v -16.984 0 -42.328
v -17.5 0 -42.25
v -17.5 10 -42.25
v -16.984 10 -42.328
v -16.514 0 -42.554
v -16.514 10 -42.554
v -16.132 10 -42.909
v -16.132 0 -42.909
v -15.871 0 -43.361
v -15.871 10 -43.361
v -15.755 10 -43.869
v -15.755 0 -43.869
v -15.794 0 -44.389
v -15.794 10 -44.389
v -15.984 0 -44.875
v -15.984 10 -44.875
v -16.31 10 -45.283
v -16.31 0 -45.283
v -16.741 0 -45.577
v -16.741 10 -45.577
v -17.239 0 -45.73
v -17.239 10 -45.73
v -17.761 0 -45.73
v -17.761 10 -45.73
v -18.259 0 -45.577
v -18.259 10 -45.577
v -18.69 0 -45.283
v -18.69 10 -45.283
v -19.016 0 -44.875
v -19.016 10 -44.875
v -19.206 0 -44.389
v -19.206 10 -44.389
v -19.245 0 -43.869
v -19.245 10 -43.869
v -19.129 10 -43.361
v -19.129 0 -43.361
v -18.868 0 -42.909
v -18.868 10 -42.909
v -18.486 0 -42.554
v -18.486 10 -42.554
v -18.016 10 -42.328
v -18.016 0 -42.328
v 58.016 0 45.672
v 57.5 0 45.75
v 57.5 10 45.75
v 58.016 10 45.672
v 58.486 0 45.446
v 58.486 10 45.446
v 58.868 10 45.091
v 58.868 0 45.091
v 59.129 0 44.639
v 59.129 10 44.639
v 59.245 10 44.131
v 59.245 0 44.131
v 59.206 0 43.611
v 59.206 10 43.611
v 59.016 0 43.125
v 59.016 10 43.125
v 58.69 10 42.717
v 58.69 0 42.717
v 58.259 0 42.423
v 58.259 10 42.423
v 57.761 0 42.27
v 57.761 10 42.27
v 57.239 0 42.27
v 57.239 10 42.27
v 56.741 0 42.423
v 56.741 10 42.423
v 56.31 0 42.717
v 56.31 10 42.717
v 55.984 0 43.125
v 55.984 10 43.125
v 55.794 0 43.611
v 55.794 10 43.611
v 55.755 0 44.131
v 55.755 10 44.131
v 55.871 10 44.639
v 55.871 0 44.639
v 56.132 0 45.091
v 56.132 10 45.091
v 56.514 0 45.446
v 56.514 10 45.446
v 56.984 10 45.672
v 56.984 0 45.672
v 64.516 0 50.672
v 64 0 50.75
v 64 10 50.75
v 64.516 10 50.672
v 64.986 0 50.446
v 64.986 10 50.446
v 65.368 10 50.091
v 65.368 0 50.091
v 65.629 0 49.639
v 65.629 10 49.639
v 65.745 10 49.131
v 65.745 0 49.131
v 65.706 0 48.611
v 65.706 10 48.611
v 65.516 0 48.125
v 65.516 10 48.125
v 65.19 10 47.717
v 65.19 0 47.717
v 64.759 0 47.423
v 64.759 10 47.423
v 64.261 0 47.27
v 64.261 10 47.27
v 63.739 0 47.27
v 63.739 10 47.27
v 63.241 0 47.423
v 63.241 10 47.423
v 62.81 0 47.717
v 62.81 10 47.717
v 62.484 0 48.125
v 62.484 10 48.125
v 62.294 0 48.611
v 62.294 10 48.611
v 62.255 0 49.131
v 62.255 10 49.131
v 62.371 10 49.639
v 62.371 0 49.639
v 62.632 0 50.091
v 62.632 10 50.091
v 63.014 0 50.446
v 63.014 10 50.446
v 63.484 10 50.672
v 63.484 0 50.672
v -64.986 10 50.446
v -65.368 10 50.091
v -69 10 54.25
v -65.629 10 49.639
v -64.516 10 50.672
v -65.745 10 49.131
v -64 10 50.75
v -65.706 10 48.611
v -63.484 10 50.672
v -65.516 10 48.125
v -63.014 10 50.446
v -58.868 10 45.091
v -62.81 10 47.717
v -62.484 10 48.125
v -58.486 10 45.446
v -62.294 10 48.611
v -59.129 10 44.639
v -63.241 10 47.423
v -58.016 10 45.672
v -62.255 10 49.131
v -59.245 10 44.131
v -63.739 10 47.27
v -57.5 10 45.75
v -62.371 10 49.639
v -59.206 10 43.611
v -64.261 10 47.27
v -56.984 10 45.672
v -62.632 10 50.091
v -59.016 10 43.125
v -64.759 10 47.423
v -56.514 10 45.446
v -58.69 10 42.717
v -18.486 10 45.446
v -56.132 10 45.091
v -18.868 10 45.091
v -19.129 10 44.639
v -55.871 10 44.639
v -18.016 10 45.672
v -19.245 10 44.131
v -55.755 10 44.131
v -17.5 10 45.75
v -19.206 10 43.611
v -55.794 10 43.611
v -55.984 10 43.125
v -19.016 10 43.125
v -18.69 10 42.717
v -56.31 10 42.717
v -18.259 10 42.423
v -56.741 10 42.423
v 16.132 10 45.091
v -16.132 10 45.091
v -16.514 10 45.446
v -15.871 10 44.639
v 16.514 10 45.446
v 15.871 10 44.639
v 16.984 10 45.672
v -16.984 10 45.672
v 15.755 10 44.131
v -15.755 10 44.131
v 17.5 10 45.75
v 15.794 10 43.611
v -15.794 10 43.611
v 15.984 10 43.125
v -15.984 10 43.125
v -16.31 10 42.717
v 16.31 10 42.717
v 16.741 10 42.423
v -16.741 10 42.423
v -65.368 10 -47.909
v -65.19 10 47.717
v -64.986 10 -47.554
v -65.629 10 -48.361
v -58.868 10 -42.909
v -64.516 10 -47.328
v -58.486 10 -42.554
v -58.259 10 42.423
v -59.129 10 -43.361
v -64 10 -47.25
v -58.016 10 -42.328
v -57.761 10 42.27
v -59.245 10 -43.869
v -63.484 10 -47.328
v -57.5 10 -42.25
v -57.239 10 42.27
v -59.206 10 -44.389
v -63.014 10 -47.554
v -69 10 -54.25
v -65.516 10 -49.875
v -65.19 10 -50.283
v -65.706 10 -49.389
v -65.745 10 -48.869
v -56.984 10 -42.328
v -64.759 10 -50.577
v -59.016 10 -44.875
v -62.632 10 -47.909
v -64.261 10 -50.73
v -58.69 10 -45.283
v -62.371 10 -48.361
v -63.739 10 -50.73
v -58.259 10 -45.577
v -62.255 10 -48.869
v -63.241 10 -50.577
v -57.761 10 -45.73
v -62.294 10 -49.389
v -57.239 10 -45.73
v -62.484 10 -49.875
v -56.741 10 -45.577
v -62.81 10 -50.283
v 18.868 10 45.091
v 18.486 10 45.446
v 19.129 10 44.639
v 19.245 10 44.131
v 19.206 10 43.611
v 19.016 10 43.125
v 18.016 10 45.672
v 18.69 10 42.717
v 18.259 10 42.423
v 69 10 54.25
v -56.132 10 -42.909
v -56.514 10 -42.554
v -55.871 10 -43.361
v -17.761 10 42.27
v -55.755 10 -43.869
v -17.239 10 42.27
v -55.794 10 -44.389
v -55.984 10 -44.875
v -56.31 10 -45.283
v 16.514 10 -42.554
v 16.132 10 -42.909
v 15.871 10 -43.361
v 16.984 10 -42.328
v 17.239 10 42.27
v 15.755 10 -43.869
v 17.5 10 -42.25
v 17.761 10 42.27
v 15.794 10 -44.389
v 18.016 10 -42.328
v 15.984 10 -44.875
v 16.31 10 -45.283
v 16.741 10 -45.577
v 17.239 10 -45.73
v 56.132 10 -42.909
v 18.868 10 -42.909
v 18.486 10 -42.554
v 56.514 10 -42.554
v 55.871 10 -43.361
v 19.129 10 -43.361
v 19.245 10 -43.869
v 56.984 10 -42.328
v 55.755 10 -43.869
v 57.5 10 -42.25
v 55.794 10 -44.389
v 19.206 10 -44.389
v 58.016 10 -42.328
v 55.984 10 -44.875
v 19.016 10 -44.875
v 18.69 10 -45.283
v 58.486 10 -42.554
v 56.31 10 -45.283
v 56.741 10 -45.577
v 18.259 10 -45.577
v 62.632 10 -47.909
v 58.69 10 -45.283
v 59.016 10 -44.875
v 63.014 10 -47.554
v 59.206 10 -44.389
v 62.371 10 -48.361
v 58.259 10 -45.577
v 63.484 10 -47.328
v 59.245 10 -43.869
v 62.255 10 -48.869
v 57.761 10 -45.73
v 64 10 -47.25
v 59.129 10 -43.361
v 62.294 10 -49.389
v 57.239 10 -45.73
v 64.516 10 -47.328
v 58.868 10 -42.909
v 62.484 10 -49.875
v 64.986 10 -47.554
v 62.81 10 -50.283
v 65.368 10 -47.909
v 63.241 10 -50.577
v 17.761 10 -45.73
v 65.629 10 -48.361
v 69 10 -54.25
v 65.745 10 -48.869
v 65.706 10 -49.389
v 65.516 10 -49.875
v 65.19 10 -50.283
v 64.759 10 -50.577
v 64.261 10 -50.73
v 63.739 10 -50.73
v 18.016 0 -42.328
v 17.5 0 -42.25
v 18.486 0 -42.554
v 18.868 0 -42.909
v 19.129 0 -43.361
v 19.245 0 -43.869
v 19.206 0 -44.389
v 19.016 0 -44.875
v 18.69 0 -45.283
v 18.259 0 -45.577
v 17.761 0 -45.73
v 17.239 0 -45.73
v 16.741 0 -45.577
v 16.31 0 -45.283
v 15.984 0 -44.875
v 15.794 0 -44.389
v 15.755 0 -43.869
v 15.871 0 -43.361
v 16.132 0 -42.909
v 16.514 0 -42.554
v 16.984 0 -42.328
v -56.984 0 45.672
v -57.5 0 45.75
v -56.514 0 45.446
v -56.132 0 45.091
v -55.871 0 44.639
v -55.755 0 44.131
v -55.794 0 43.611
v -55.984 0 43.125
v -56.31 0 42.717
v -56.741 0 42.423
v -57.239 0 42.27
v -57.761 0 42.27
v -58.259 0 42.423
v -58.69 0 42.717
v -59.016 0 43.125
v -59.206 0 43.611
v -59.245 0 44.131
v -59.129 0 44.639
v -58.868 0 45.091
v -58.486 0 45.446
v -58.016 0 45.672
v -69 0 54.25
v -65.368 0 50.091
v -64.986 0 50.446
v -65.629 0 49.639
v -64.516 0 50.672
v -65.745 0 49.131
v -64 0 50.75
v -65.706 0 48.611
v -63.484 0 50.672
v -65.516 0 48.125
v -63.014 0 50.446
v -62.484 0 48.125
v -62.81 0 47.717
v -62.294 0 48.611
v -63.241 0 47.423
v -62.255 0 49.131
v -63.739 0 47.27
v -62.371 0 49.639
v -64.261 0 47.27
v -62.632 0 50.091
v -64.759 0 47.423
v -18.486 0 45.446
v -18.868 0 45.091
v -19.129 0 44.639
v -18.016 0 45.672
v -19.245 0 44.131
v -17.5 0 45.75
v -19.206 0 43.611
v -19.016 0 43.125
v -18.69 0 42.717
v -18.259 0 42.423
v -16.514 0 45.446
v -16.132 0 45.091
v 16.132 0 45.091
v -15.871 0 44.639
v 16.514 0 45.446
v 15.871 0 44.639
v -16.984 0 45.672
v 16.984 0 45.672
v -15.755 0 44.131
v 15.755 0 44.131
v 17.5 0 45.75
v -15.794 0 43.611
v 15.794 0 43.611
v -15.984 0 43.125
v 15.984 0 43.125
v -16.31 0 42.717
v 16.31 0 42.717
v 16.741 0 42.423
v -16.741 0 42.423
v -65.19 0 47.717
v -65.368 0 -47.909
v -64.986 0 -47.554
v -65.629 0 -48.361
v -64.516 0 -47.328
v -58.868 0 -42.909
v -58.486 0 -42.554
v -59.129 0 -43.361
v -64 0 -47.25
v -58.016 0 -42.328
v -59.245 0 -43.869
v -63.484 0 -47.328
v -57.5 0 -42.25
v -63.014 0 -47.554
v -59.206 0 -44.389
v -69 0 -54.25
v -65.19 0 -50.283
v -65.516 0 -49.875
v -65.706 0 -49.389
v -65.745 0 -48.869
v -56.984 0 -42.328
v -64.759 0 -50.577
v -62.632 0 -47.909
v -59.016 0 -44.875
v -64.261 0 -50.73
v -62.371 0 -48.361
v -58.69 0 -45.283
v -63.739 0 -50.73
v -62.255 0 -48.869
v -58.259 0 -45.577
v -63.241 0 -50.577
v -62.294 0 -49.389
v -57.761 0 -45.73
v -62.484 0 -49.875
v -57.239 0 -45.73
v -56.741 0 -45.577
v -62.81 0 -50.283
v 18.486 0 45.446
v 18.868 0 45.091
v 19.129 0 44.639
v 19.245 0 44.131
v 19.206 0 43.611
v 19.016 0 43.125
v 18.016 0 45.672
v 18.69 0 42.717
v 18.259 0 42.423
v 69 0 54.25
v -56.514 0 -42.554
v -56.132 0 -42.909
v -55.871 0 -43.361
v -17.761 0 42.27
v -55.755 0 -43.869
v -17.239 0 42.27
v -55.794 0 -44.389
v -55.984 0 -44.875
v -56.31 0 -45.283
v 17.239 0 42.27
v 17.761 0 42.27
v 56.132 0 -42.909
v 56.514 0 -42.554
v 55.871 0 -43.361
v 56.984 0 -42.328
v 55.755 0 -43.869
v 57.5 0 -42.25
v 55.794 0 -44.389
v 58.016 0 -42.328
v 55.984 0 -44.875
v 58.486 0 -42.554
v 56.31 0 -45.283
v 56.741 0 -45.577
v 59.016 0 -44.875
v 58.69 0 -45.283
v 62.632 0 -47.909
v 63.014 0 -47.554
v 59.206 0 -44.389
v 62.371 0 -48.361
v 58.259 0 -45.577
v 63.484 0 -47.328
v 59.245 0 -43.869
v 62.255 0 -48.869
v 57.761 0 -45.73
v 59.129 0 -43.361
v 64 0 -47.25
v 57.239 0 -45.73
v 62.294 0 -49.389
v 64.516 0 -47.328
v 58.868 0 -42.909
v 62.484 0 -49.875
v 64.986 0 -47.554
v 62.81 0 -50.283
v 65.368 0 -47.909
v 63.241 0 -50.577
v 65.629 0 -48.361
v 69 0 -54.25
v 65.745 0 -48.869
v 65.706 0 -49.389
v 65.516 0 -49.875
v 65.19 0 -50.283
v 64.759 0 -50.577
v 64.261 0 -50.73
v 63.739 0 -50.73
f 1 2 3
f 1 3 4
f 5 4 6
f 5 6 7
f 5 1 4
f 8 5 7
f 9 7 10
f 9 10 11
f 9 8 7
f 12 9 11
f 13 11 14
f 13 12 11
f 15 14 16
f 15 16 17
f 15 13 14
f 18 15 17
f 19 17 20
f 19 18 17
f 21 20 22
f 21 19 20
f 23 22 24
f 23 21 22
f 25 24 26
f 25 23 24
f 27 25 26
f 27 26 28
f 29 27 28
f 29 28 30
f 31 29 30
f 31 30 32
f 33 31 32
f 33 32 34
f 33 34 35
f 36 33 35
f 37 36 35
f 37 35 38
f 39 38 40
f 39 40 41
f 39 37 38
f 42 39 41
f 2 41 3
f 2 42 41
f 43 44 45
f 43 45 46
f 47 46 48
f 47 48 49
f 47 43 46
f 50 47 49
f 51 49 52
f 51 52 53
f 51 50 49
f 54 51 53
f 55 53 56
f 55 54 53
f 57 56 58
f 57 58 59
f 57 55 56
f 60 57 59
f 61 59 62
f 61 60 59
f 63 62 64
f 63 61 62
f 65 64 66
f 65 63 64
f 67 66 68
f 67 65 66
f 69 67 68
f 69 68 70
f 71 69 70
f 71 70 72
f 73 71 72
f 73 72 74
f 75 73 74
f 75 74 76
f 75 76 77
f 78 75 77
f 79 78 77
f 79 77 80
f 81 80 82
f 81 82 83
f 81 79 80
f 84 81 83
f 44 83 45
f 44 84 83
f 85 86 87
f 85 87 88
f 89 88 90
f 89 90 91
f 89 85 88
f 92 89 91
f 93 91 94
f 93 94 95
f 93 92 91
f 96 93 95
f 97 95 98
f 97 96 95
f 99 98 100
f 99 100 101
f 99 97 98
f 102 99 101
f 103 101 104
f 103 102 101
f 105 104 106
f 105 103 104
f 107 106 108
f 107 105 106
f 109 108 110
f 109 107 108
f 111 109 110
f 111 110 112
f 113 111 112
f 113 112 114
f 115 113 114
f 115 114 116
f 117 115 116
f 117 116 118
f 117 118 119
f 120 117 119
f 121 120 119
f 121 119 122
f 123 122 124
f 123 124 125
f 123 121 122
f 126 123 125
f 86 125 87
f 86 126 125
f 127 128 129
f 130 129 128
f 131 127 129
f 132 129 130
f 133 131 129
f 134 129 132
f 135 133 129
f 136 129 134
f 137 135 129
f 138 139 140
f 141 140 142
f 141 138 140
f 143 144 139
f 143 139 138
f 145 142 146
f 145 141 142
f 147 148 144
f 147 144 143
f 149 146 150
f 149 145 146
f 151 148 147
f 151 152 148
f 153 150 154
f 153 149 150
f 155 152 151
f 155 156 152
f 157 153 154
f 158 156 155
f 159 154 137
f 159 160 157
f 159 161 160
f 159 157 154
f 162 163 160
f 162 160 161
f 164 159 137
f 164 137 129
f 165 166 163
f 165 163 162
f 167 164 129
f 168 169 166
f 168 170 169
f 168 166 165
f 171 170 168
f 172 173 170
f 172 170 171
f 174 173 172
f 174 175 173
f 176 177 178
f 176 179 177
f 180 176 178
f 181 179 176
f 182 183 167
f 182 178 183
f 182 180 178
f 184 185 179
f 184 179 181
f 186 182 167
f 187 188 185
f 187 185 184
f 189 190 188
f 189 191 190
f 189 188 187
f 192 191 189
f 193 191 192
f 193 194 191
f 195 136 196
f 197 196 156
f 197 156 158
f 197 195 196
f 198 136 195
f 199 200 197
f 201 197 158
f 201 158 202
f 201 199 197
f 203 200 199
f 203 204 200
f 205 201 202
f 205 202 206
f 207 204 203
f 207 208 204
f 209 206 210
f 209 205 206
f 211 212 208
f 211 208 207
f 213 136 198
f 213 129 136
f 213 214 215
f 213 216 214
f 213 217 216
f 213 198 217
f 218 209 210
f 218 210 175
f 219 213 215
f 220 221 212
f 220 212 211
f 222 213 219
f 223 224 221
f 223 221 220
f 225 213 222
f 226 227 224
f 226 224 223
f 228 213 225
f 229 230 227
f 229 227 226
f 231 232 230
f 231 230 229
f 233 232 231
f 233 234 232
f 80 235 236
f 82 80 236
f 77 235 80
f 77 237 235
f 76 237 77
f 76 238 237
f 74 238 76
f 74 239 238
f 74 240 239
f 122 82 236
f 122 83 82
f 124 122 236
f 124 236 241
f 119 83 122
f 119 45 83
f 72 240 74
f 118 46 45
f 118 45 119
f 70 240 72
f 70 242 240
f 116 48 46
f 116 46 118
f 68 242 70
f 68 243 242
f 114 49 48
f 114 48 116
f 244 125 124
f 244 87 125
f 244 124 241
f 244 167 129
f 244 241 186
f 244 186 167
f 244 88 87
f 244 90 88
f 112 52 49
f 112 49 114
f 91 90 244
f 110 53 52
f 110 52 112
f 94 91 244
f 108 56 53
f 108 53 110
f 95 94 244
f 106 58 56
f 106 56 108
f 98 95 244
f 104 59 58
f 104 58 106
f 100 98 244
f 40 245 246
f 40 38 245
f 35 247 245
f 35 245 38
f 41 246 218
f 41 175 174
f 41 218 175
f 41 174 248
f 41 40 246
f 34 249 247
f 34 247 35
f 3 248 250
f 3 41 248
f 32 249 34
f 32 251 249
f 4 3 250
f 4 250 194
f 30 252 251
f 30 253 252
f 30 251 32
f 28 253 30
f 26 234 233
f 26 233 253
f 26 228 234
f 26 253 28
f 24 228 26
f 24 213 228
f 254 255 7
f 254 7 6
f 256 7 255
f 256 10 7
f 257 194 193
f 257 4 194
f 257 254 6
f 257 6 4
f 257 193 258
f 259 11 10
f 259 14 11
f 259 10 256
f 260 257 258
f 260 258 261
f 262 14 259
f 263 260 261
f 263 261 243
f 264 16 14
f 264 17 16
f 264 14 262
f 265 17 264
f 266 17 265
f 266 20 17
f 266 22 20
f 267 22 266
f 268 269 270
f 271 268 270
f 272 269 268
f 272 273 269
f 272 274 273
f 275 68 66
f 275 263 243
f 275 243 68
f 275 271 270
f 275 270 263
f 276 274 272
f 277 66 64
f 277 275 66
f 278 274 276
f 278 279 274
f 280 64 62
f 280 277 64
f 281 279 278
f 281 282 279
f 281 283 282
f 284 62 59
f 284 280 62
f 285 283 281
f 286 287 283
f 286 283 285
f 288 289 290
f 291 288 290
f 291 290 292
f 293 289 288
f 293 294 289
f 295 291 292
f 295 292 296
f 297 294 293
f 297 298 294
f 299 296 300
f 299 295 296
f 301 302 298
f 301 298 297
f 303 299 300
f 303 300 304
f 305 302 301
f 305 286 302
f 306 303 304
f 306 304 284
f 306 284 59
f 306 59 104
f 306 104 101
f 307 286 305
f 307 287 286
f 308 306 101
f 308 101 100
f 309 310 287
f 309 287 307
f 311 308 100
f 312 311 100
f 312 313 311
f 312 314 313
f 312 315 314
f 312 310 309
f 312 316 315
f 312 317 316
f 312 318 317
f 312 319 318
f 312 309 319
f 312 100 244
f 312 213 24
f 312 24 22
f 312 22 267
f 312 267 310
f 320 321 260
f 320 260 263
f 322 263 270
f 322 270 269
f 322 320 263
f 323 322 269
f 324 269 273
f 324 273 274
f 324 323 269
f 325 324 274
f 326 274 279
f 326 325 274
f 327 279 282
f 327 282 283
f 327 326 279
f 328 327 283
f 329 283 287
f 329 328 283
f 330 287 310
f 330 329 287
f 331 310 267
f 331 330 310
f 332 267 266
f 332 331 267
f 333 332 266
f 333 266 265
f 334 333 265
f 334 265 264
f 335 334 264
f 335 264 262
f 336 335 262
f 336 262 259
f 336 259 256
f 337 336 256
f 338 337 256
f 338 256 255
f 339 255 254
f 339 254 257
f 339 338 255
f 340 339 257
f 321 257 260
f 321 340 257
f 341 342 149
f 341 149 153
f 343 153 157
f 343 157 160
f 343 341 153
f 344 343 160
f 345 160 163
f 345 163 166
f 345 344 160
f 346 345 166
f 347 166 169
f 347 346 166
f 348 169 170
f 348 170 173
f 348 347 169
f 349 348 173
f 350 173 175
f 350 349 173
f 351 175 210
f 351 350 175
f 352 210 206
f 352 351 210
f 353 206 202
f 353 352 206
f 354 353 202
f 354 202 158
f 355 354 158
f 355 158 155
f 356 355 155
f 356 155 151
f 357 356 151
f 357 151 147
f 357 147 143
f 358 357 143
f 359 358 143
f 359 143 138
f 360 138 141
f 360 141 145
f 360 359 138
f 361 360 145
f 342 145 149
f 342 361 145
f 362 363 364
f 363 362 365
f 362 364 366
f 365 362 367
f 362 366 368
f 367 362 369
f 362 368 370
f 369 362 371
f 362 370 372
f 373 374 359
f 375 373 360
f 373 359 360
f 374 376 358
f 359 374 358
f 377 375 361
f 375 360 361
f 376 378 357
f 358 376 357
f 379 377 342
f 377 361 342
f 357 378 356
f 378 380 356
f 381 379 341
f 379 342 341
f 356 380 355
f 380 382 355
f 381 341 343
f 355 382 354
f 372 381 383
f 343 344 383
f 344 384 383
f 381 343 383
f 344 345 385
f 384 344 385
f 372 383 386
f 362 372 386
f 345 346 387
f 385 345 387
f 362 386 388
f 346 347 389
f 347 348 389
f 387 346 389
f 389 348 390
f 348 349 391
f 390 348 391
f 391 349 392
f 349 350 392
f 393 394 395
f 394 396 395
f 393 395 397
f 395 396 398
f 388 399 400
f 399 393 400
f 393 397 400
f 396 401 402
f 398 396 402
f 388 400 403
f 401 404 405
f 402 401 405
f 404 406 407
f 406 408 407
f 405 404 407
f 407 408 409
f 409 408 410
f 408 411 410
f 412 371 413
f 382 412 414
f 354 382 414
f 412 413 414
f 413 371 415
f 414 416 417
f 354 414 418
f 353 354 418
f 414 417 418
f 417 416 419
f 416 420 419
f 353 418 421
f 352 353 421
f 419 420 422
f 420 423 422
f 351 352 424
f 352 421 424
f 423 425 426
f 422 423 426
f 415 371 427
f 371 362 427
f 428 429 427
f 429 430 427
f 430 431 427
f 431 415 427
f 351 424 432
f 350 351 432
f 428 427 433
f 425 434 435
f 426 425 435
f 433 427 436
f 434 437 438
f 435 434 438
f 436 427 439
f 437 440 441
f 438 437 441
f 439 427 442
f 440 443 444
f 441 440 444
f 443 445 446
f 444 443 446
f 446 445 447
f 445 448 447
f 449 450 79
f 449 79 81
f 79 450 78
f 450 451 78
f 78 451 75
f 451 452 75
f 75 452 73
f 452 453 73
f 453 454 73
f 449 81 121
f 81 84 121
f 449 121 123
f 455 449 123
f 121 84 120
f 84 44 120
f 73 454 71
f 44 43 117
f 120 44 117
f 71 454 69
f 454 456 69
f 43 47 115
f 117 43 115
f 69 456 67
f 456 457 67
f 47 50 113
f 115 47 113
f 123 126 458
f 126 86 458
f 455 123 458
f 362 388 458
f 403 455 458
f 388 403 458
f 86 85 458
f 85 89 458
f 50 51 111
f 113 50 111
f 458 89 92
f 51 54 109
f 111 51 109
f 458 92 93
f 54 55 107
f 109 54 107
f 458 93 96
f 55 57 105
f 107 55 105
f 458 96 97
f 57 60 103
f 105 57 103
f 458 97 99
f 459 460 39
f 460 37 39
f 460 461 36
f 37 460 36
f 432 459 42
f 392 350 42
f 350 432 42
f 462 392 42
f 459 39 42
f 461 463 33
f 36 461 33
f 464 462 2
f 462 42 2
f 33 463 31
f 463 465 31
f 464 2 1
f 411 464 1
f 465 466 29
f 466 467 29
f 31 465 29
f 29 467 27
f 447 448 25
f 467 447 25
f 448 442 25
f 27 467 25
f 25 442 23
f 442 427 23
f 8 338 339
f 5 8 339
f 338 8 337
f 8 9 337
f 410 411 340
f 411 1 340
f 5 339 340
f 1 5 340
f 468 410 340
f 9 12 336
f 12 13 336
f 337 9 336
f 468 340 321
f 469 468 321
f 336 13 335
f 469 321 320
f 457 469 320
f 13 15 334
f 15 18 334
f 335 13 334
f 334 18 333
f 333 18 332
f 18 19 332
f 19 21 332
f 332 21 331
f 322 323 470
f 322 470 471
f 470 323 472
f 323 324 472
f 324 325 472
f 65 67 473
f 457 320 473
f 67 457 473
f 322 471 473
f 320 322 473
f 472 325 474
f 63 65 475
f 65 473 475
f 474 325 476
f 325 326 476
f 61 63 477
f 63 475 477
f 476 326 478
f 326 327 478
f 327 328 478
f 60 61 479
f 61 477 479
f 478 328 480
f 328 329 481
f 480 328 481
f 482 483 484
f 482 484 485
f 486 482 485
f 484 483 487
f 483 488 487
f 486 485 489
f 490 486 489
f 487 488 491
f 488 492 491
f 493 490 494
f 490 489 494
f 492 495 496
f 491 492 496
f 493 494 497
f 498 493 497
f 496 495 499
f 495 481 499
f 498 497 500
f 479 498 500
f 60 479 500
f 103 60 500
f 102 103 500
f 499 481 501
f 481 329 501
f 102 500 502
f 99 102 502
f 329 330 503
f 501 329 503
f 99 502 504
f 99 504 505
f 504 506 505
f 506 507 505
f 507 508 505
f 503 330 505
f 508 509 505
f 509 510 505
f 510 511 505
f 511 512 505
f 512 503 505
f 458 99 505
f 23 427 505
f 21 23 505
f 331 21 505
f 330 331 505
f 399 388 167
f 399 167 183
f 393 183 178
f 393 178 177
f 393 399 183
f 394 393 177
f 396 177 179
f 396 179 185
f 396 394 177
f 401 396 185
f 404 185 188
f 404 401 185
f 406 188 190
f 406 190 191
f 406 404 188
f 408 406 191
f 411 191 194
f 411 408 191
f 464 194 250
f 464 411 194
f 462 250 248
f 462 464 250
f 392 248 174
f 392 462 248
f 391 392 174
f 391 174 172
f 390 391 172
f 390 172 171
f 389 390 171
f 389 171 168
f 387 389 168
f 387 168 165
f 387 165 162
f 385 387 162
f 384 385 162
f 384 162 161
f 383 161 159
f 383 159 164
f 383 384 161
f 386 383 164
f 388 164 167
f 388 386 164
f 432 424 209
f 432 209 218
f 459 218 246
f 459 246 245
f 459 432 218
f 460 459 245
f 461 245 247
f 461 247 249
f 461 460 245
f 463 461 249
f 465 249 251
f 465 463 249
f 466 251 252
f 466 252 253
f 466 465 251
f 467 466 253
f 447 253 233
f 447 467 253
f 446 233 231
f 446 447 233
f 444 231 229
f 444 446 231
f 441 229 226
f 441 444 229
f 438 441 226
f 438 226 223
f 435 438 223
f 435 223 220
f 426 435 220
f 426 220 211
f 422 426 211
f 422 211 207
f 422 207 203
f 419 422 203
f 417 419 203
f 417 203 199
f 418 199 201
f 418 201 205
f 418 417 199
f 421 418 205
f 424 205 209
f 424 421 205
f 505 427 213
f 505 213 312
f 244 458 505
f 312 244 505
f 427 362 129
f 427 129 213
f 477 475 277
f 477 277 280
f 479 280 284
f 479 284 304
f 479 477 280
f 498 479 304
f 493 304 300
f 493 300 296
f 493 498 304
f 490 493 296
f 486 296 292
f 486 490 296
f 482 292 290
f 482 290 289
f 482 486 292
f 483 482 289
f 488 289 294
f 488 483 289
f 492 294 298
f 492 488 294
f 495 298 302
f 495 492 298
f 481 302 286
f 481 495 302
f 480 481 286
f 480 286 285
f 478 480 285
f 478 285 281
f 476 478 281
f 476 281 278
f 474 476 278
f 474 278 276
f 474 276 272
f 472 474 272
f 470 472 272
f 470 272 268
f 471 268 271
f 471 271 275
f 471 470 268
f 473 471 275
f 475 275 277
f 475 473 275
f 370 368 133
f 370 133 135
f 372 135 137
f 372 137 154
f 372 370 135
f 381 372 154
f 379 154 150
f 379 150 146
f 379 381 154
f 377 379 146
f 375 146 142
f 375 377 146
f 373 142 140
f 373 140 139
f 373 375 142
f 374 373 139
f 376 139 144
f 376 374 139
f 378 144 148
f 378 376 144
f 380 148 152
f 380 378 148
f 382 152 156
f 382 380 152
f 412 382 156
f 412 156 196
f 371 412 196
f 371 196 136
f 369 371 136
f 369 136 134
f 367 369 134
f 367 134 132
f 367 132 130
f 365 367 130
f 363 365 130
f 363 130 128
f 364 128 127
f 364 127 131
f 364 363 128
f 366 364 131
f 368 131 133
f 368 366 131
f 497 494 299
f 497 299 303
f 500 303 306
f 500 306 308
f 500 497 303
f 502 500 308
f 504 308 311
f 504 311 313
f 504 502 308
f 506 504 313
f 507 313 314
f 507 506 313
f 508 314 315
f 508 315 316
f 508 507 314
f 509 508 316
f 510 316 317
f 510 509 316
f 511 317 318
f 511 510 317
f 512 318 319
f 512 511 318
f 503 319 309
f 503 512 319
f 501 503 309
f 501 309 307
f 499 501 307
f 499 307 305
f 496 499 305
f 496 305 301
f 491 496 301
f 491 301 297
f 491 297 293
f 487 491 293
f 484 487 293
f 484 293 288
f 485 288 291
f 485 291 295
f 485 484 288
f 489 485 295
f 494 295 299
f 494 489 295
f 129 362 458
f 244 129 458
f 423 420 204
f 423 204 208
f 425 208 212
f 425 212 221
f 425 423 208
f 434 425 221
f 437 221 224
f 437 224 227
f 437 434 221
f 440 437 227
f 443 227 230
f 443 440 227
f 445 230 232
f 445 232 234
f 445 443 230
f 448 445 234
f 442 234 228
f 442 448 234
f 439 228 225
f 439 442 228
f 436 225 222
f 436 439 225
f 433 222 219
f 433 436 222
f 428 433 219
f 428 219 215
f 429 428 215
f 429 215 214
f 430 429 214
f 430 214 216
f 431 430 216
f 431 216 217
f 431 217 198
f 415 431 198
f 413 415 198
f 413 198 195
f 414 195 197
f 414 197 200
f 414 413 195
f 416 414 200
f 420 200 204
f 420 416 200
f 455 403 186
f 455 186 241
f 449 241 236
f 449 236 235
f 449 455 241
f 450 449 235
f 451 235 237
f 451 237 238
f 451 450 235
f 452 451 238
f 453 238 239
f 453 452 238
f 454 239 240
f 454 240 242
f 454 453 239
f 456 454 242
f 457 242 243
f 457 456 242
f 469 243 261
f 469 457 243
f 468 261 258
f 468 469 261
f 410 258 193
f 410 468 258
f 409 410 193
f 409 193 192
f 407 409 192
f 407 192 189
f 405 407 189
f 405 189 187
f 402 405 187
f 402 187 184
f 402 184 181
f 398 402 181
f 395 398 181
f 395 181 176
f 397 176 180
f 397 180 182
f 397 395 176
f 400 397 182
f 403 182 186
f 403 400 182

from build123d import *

# Parameters (mm, degrees)
SKETCH1_W           = 138
SKETCH1_H           = 108.5
SKETCH1_R           = 1.75
BOSS_EXTRUDE1_DEPTH = 10


with BuildPart() as part:
    # Sketch1 → Boss-Extrude1 (new body)
    with BuildSketch(Plane(origin=(0, 0, 0), x_dir=(1, 0, 0), z_dir=(0, 1, 0))):
        Rectangle(SKETCH1_W, SKETCH1_H)
        with Locations(Location((-64, 49, 0), (0, 0, 270))):  # turned: the seam where the file's is
            Circle(SKETCH1_R, mode=Mode.SUBTRACT)
        with Locations(Location((-64, -49, 0), (0, 0, 270))):  # turned: the seam where the file's is
            Circle(SKETCH1_R, mode=Mode.SUBTRACT)
        with Locations(Location((64, -49, 0), (0, 0, 270))):  # turned: the seam where the file's is
            Circle(SKETCH1_R, mode=Mode.SUBTRACT)
        with Locations(Location((64, 49, 0), (0, 0, 270))):  # turned: the seam where the file's is
            Circle(SKETCH1_R, mode=Mode.SUBTRACT)
        with Locations(Location((-57.5, 44, 0), (0, 0, 270))):  # turned: the seam where the file's is
            Circle(SKETCH1_R, mode=Mode.SUBTRACT)
        with Locations(Location((-17.5, 44, 0), (0, 0, 270))):  # turned: the seam where the file's is
            Circle(SKETCH1_R, mode=Mode.SUBTRACT)
        with Locations(Location((-17.5, -44, 0), (0, 0, 270))):  # turned: the seam where the file's is
            Circle(SKETCH1_R, mode=Mode.SUBTRACT)
        with Locations(Location((-57.5, -44, 0), (0, 0, 270))):  # turned: the seam where the file's is
            Circle(SKETCH1_R, mode=Mode.SUBTRACT)
        with Locations(Location((17.5, -44, 0), (0, 0, 270))):  # turned: the seam where the file's is
            Circle(SKETCH1_R, mode=Mode.SUBTRACT)
        with Locations(Location((57.5, -44, 0), (0, 0, 270))):  # turned: the seam where the file's is
            Circle(SKETCH1_R, mode=Mode.SUBTRACT)
        with Locations(Location((57.5, 44, 0), (0, 0, 270))):  # turned: the seam where the file's is
            Circle(SKETCH1_R, mode=Mode.SUBTRACT)
        with Locations(Location((17.5, 44, 0), (0, 0, 270))):  # turned: the seam where the file's is
            Circle(SKETCH1_R, mode=Mode.SUBTRACT)
    extrude(amount=BOSS_EXTRUDE1_DEPTH)


solid = part.part
